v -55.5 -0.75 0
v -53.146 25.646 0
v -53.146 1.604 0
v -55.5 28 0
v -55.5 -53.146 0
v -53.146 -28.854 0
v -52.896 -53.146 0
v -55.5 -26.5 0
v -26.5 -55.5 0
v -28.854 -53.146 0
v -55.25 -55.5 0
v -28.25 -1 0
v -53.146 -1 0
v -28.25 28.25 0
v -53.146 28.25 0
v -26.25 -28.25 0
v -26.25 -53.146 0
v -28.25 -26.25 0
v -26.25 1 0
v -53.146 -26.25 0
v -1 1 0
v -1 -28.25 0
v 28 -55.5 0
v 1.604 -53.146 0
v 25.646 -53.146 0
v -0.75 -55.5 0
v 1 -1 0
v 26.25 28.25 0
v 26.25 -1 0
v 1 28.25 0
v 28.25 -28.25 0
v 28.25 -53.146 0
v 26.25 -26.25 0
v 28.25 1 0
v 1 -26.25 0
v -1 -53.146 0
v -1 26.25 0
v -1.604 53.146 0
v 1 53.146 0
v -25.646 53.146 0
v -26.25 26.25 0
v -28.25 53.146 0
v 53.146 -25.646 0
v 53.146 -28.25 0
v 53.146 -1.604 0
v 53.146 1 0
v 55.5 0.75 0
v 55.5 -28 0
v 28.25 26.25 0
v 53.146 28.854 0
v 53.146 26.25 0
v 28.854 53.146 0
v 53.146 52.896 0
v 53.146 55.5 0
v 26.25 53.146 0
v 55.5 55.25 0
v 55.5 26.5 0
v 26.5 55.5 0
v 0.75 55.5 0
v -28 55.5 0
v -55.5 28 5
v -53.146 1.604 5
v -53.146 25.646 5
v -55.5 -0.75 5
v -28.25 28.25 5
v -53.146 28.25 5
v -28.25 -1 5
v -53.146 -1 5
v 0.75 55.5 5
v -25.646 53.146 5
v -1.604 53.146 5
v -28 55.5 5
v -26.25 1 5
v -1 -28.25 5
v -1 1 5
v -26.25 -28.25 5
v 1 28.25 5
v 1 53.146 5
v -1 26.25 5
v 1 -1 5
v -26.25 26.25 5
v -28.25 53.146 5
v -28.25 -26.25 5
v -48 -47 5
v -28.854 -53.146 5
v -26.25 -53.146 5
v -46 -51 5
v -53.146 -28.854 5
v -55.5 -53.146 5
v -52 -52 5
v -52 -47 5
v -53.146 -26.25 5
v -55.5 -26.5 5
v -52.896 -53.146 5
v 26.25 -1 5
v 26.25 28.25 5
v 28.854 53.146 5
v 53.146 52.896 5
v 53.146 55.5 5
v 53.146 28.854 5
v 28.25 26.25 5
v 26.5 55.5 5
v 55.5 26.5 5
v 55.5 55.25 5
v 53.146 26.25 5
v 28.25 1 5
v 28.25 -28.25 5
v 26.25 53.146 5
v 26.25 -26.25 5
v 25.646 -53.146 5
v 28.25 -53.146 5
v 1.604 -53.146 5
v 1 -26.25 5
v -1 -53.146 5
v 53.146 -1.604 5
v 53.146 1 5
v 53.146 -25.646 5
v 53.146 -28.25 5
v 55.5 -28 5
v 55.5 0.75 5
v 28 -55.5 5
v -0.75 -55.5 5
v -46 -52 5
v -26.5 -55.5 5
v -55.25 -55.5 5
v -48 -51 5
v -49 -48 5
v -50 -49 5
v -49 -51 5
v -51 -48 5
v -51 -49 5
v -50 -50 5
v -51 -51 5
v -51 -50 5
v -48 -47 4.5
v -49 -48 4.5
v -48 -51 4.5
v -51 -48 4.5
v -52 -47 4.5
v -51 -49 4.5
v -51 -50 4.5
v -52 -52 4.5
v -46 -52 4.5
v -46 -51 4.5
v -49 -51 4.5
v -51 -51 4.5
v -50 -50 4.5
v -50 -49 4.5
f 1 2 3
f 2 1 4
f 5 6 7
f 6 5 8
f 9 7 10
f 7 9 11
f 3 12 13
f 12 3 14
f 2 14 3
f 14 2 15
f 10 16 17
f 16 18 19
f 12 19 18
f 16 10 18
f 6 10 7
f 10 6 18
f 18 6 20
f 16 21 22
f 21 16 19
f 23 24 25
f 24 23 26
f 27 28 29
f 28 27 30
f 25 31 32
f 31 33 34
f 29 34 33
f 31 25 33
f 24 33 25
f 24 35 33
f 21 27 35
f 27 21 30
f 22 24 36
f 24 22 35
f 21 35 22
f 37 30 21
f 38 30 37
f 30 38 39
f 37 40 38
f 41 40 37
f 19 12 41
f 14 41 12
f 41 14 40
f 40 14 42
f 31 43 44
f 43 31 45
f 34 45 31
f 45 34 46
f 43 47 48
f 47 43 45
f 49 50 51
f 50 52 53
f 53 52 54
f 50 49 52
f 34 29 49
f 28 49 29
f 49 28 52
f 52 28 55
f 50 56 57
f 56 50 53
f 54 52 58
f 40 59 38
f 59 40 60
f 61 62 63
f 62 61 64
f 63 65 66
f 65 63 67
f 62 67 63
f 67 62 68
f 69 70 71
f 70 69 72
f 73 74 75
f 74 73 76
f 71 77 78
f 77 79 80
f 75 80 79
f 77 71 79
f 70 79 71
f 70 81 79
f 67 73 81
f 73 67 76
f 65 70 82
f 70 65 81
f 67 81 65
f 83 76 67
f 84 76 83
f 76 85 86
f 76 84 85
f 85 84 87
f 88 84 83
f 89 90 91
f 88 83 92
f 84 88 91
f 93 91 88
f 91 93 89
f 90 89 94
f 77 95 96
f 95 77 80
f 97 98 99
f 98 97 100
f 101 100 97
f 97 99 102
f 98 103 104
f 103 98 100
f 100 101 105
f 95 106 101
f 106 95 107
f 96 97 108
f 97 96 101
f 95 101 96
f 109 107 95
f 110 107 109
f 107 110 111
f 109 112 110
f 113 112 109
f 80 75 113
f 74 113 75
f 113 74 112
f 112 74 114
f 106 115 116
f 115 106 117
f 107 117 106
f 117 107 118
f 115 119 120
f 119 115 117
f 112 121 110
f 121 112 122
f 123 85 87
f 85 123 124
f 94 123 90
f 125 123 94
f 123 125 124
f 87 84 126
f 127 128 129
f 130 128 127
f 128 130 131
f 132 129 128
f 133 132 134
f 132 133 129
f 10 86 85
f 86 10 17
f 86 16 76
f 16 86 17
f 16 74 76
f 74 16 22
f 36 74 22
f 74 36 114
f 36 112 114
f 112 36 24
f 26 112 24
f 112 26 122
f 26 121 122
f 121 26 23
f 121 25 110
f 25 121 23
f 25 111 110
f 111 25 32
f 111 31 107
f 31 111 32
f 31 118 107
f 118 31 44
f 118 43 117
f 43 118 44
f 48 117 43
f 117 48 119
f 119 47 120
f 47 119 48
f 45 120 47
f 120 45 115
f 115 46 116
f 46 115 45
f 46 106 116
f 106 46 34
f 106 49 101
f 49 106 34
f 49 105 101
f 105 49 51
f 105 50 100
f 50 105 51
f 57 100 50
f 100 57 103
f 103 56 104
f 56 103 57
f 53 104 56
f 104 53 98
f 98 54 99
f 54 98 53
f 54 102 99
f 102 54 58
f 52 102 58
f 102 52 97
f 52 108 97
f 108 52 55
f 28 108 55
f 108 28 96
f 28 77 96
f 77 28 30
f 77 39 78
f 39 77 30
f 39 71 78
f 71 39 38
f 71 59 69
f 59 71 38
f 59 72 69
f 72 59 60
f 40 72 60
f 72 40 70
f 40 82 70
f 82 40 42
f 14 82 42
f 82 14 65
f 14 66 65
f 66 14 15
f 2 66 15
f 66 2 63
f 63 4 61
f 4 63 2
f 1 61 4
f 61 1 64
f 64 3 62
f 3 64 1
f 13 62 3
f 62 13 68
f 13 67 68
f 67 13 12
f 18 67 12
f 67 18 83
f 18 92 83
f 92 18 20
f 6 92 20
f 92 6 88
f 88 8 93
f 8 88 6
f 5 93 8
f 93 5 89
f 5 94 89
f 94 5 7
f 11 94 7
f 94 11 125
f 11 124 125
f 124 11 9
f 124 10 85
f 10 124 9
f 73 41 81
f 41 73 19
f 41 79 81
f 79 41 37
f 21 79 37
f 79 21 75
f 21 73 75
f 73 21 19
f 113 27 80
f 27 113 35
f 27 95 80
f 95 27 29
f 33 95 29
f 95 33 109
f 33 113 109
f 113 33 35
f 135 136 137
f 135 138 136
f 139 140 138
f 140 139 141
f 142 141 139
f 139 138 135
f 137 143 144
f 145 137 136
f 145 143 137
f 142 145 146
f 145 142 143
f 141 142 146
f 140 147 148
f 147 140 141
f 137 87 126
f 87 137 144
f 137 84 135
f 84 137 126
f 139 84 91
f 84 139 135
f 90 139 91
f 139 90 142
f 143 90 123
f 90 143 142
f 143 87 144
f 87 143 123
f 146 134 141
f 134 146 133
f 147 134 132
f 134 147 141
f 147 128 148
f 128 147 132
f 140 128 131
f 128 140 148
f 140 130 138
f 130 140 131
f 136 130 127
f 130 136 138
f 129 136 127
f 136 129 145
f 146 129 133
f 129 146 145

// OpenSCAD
// chess board

// size of 8x8 chess board
size=220;
// thickness of board
T=5;
// overlap between squares
overlap=2;
// tolerance for easy fit
tol=0.5;

L=(size-overlap)/8;

translate(2*L*[-1,-1,0])4x4();
*assembly();

module assembly(){
	4x4();
	rotate([0,0,180])4x4();
	translate([-4*L,0,0])4x4();
	translate([0,-4*L,0])4x4();
}

module 4x4()
difference(){
	linear_extrude(height=T)translate(-overlap/2*[1,1])difference(){
		for(i=[0:3],j=[0:3])if((i+j)%2==0)translate([i*L,j*L])square(L+overlap);
		notches2();
		translate((L*4+overlap)*[1,1])mirror([1,1])notches2();
	}
	translate([overlap+tol,overlap+tol,T])monogram();
}

module notches2(){
	notch();
	notches();
	mirror([1,-1])notches();
}

module notches(){
	translate([2*L,0])notch();
	translate([L+overlap,0])mirror([1,0])notch();
	translate([3*L+overlap,0])mirror([1,0])notch();
}

module notch()
translate([tol/2,0])difference(){
	square(2*overlap+tol*sqrt(2),center=true);
	rotate(-45)translate([0,-2*overlap])square(overlap*4);
}

module monogram(h=1)
linear_extrude(height=h,center=true)
union(){
	difference(){
		square([4,5]);
		translate([1,1])square([2,3]);
	}
	square([6,1]);
	translate([0,2])square([2,1]);
}
